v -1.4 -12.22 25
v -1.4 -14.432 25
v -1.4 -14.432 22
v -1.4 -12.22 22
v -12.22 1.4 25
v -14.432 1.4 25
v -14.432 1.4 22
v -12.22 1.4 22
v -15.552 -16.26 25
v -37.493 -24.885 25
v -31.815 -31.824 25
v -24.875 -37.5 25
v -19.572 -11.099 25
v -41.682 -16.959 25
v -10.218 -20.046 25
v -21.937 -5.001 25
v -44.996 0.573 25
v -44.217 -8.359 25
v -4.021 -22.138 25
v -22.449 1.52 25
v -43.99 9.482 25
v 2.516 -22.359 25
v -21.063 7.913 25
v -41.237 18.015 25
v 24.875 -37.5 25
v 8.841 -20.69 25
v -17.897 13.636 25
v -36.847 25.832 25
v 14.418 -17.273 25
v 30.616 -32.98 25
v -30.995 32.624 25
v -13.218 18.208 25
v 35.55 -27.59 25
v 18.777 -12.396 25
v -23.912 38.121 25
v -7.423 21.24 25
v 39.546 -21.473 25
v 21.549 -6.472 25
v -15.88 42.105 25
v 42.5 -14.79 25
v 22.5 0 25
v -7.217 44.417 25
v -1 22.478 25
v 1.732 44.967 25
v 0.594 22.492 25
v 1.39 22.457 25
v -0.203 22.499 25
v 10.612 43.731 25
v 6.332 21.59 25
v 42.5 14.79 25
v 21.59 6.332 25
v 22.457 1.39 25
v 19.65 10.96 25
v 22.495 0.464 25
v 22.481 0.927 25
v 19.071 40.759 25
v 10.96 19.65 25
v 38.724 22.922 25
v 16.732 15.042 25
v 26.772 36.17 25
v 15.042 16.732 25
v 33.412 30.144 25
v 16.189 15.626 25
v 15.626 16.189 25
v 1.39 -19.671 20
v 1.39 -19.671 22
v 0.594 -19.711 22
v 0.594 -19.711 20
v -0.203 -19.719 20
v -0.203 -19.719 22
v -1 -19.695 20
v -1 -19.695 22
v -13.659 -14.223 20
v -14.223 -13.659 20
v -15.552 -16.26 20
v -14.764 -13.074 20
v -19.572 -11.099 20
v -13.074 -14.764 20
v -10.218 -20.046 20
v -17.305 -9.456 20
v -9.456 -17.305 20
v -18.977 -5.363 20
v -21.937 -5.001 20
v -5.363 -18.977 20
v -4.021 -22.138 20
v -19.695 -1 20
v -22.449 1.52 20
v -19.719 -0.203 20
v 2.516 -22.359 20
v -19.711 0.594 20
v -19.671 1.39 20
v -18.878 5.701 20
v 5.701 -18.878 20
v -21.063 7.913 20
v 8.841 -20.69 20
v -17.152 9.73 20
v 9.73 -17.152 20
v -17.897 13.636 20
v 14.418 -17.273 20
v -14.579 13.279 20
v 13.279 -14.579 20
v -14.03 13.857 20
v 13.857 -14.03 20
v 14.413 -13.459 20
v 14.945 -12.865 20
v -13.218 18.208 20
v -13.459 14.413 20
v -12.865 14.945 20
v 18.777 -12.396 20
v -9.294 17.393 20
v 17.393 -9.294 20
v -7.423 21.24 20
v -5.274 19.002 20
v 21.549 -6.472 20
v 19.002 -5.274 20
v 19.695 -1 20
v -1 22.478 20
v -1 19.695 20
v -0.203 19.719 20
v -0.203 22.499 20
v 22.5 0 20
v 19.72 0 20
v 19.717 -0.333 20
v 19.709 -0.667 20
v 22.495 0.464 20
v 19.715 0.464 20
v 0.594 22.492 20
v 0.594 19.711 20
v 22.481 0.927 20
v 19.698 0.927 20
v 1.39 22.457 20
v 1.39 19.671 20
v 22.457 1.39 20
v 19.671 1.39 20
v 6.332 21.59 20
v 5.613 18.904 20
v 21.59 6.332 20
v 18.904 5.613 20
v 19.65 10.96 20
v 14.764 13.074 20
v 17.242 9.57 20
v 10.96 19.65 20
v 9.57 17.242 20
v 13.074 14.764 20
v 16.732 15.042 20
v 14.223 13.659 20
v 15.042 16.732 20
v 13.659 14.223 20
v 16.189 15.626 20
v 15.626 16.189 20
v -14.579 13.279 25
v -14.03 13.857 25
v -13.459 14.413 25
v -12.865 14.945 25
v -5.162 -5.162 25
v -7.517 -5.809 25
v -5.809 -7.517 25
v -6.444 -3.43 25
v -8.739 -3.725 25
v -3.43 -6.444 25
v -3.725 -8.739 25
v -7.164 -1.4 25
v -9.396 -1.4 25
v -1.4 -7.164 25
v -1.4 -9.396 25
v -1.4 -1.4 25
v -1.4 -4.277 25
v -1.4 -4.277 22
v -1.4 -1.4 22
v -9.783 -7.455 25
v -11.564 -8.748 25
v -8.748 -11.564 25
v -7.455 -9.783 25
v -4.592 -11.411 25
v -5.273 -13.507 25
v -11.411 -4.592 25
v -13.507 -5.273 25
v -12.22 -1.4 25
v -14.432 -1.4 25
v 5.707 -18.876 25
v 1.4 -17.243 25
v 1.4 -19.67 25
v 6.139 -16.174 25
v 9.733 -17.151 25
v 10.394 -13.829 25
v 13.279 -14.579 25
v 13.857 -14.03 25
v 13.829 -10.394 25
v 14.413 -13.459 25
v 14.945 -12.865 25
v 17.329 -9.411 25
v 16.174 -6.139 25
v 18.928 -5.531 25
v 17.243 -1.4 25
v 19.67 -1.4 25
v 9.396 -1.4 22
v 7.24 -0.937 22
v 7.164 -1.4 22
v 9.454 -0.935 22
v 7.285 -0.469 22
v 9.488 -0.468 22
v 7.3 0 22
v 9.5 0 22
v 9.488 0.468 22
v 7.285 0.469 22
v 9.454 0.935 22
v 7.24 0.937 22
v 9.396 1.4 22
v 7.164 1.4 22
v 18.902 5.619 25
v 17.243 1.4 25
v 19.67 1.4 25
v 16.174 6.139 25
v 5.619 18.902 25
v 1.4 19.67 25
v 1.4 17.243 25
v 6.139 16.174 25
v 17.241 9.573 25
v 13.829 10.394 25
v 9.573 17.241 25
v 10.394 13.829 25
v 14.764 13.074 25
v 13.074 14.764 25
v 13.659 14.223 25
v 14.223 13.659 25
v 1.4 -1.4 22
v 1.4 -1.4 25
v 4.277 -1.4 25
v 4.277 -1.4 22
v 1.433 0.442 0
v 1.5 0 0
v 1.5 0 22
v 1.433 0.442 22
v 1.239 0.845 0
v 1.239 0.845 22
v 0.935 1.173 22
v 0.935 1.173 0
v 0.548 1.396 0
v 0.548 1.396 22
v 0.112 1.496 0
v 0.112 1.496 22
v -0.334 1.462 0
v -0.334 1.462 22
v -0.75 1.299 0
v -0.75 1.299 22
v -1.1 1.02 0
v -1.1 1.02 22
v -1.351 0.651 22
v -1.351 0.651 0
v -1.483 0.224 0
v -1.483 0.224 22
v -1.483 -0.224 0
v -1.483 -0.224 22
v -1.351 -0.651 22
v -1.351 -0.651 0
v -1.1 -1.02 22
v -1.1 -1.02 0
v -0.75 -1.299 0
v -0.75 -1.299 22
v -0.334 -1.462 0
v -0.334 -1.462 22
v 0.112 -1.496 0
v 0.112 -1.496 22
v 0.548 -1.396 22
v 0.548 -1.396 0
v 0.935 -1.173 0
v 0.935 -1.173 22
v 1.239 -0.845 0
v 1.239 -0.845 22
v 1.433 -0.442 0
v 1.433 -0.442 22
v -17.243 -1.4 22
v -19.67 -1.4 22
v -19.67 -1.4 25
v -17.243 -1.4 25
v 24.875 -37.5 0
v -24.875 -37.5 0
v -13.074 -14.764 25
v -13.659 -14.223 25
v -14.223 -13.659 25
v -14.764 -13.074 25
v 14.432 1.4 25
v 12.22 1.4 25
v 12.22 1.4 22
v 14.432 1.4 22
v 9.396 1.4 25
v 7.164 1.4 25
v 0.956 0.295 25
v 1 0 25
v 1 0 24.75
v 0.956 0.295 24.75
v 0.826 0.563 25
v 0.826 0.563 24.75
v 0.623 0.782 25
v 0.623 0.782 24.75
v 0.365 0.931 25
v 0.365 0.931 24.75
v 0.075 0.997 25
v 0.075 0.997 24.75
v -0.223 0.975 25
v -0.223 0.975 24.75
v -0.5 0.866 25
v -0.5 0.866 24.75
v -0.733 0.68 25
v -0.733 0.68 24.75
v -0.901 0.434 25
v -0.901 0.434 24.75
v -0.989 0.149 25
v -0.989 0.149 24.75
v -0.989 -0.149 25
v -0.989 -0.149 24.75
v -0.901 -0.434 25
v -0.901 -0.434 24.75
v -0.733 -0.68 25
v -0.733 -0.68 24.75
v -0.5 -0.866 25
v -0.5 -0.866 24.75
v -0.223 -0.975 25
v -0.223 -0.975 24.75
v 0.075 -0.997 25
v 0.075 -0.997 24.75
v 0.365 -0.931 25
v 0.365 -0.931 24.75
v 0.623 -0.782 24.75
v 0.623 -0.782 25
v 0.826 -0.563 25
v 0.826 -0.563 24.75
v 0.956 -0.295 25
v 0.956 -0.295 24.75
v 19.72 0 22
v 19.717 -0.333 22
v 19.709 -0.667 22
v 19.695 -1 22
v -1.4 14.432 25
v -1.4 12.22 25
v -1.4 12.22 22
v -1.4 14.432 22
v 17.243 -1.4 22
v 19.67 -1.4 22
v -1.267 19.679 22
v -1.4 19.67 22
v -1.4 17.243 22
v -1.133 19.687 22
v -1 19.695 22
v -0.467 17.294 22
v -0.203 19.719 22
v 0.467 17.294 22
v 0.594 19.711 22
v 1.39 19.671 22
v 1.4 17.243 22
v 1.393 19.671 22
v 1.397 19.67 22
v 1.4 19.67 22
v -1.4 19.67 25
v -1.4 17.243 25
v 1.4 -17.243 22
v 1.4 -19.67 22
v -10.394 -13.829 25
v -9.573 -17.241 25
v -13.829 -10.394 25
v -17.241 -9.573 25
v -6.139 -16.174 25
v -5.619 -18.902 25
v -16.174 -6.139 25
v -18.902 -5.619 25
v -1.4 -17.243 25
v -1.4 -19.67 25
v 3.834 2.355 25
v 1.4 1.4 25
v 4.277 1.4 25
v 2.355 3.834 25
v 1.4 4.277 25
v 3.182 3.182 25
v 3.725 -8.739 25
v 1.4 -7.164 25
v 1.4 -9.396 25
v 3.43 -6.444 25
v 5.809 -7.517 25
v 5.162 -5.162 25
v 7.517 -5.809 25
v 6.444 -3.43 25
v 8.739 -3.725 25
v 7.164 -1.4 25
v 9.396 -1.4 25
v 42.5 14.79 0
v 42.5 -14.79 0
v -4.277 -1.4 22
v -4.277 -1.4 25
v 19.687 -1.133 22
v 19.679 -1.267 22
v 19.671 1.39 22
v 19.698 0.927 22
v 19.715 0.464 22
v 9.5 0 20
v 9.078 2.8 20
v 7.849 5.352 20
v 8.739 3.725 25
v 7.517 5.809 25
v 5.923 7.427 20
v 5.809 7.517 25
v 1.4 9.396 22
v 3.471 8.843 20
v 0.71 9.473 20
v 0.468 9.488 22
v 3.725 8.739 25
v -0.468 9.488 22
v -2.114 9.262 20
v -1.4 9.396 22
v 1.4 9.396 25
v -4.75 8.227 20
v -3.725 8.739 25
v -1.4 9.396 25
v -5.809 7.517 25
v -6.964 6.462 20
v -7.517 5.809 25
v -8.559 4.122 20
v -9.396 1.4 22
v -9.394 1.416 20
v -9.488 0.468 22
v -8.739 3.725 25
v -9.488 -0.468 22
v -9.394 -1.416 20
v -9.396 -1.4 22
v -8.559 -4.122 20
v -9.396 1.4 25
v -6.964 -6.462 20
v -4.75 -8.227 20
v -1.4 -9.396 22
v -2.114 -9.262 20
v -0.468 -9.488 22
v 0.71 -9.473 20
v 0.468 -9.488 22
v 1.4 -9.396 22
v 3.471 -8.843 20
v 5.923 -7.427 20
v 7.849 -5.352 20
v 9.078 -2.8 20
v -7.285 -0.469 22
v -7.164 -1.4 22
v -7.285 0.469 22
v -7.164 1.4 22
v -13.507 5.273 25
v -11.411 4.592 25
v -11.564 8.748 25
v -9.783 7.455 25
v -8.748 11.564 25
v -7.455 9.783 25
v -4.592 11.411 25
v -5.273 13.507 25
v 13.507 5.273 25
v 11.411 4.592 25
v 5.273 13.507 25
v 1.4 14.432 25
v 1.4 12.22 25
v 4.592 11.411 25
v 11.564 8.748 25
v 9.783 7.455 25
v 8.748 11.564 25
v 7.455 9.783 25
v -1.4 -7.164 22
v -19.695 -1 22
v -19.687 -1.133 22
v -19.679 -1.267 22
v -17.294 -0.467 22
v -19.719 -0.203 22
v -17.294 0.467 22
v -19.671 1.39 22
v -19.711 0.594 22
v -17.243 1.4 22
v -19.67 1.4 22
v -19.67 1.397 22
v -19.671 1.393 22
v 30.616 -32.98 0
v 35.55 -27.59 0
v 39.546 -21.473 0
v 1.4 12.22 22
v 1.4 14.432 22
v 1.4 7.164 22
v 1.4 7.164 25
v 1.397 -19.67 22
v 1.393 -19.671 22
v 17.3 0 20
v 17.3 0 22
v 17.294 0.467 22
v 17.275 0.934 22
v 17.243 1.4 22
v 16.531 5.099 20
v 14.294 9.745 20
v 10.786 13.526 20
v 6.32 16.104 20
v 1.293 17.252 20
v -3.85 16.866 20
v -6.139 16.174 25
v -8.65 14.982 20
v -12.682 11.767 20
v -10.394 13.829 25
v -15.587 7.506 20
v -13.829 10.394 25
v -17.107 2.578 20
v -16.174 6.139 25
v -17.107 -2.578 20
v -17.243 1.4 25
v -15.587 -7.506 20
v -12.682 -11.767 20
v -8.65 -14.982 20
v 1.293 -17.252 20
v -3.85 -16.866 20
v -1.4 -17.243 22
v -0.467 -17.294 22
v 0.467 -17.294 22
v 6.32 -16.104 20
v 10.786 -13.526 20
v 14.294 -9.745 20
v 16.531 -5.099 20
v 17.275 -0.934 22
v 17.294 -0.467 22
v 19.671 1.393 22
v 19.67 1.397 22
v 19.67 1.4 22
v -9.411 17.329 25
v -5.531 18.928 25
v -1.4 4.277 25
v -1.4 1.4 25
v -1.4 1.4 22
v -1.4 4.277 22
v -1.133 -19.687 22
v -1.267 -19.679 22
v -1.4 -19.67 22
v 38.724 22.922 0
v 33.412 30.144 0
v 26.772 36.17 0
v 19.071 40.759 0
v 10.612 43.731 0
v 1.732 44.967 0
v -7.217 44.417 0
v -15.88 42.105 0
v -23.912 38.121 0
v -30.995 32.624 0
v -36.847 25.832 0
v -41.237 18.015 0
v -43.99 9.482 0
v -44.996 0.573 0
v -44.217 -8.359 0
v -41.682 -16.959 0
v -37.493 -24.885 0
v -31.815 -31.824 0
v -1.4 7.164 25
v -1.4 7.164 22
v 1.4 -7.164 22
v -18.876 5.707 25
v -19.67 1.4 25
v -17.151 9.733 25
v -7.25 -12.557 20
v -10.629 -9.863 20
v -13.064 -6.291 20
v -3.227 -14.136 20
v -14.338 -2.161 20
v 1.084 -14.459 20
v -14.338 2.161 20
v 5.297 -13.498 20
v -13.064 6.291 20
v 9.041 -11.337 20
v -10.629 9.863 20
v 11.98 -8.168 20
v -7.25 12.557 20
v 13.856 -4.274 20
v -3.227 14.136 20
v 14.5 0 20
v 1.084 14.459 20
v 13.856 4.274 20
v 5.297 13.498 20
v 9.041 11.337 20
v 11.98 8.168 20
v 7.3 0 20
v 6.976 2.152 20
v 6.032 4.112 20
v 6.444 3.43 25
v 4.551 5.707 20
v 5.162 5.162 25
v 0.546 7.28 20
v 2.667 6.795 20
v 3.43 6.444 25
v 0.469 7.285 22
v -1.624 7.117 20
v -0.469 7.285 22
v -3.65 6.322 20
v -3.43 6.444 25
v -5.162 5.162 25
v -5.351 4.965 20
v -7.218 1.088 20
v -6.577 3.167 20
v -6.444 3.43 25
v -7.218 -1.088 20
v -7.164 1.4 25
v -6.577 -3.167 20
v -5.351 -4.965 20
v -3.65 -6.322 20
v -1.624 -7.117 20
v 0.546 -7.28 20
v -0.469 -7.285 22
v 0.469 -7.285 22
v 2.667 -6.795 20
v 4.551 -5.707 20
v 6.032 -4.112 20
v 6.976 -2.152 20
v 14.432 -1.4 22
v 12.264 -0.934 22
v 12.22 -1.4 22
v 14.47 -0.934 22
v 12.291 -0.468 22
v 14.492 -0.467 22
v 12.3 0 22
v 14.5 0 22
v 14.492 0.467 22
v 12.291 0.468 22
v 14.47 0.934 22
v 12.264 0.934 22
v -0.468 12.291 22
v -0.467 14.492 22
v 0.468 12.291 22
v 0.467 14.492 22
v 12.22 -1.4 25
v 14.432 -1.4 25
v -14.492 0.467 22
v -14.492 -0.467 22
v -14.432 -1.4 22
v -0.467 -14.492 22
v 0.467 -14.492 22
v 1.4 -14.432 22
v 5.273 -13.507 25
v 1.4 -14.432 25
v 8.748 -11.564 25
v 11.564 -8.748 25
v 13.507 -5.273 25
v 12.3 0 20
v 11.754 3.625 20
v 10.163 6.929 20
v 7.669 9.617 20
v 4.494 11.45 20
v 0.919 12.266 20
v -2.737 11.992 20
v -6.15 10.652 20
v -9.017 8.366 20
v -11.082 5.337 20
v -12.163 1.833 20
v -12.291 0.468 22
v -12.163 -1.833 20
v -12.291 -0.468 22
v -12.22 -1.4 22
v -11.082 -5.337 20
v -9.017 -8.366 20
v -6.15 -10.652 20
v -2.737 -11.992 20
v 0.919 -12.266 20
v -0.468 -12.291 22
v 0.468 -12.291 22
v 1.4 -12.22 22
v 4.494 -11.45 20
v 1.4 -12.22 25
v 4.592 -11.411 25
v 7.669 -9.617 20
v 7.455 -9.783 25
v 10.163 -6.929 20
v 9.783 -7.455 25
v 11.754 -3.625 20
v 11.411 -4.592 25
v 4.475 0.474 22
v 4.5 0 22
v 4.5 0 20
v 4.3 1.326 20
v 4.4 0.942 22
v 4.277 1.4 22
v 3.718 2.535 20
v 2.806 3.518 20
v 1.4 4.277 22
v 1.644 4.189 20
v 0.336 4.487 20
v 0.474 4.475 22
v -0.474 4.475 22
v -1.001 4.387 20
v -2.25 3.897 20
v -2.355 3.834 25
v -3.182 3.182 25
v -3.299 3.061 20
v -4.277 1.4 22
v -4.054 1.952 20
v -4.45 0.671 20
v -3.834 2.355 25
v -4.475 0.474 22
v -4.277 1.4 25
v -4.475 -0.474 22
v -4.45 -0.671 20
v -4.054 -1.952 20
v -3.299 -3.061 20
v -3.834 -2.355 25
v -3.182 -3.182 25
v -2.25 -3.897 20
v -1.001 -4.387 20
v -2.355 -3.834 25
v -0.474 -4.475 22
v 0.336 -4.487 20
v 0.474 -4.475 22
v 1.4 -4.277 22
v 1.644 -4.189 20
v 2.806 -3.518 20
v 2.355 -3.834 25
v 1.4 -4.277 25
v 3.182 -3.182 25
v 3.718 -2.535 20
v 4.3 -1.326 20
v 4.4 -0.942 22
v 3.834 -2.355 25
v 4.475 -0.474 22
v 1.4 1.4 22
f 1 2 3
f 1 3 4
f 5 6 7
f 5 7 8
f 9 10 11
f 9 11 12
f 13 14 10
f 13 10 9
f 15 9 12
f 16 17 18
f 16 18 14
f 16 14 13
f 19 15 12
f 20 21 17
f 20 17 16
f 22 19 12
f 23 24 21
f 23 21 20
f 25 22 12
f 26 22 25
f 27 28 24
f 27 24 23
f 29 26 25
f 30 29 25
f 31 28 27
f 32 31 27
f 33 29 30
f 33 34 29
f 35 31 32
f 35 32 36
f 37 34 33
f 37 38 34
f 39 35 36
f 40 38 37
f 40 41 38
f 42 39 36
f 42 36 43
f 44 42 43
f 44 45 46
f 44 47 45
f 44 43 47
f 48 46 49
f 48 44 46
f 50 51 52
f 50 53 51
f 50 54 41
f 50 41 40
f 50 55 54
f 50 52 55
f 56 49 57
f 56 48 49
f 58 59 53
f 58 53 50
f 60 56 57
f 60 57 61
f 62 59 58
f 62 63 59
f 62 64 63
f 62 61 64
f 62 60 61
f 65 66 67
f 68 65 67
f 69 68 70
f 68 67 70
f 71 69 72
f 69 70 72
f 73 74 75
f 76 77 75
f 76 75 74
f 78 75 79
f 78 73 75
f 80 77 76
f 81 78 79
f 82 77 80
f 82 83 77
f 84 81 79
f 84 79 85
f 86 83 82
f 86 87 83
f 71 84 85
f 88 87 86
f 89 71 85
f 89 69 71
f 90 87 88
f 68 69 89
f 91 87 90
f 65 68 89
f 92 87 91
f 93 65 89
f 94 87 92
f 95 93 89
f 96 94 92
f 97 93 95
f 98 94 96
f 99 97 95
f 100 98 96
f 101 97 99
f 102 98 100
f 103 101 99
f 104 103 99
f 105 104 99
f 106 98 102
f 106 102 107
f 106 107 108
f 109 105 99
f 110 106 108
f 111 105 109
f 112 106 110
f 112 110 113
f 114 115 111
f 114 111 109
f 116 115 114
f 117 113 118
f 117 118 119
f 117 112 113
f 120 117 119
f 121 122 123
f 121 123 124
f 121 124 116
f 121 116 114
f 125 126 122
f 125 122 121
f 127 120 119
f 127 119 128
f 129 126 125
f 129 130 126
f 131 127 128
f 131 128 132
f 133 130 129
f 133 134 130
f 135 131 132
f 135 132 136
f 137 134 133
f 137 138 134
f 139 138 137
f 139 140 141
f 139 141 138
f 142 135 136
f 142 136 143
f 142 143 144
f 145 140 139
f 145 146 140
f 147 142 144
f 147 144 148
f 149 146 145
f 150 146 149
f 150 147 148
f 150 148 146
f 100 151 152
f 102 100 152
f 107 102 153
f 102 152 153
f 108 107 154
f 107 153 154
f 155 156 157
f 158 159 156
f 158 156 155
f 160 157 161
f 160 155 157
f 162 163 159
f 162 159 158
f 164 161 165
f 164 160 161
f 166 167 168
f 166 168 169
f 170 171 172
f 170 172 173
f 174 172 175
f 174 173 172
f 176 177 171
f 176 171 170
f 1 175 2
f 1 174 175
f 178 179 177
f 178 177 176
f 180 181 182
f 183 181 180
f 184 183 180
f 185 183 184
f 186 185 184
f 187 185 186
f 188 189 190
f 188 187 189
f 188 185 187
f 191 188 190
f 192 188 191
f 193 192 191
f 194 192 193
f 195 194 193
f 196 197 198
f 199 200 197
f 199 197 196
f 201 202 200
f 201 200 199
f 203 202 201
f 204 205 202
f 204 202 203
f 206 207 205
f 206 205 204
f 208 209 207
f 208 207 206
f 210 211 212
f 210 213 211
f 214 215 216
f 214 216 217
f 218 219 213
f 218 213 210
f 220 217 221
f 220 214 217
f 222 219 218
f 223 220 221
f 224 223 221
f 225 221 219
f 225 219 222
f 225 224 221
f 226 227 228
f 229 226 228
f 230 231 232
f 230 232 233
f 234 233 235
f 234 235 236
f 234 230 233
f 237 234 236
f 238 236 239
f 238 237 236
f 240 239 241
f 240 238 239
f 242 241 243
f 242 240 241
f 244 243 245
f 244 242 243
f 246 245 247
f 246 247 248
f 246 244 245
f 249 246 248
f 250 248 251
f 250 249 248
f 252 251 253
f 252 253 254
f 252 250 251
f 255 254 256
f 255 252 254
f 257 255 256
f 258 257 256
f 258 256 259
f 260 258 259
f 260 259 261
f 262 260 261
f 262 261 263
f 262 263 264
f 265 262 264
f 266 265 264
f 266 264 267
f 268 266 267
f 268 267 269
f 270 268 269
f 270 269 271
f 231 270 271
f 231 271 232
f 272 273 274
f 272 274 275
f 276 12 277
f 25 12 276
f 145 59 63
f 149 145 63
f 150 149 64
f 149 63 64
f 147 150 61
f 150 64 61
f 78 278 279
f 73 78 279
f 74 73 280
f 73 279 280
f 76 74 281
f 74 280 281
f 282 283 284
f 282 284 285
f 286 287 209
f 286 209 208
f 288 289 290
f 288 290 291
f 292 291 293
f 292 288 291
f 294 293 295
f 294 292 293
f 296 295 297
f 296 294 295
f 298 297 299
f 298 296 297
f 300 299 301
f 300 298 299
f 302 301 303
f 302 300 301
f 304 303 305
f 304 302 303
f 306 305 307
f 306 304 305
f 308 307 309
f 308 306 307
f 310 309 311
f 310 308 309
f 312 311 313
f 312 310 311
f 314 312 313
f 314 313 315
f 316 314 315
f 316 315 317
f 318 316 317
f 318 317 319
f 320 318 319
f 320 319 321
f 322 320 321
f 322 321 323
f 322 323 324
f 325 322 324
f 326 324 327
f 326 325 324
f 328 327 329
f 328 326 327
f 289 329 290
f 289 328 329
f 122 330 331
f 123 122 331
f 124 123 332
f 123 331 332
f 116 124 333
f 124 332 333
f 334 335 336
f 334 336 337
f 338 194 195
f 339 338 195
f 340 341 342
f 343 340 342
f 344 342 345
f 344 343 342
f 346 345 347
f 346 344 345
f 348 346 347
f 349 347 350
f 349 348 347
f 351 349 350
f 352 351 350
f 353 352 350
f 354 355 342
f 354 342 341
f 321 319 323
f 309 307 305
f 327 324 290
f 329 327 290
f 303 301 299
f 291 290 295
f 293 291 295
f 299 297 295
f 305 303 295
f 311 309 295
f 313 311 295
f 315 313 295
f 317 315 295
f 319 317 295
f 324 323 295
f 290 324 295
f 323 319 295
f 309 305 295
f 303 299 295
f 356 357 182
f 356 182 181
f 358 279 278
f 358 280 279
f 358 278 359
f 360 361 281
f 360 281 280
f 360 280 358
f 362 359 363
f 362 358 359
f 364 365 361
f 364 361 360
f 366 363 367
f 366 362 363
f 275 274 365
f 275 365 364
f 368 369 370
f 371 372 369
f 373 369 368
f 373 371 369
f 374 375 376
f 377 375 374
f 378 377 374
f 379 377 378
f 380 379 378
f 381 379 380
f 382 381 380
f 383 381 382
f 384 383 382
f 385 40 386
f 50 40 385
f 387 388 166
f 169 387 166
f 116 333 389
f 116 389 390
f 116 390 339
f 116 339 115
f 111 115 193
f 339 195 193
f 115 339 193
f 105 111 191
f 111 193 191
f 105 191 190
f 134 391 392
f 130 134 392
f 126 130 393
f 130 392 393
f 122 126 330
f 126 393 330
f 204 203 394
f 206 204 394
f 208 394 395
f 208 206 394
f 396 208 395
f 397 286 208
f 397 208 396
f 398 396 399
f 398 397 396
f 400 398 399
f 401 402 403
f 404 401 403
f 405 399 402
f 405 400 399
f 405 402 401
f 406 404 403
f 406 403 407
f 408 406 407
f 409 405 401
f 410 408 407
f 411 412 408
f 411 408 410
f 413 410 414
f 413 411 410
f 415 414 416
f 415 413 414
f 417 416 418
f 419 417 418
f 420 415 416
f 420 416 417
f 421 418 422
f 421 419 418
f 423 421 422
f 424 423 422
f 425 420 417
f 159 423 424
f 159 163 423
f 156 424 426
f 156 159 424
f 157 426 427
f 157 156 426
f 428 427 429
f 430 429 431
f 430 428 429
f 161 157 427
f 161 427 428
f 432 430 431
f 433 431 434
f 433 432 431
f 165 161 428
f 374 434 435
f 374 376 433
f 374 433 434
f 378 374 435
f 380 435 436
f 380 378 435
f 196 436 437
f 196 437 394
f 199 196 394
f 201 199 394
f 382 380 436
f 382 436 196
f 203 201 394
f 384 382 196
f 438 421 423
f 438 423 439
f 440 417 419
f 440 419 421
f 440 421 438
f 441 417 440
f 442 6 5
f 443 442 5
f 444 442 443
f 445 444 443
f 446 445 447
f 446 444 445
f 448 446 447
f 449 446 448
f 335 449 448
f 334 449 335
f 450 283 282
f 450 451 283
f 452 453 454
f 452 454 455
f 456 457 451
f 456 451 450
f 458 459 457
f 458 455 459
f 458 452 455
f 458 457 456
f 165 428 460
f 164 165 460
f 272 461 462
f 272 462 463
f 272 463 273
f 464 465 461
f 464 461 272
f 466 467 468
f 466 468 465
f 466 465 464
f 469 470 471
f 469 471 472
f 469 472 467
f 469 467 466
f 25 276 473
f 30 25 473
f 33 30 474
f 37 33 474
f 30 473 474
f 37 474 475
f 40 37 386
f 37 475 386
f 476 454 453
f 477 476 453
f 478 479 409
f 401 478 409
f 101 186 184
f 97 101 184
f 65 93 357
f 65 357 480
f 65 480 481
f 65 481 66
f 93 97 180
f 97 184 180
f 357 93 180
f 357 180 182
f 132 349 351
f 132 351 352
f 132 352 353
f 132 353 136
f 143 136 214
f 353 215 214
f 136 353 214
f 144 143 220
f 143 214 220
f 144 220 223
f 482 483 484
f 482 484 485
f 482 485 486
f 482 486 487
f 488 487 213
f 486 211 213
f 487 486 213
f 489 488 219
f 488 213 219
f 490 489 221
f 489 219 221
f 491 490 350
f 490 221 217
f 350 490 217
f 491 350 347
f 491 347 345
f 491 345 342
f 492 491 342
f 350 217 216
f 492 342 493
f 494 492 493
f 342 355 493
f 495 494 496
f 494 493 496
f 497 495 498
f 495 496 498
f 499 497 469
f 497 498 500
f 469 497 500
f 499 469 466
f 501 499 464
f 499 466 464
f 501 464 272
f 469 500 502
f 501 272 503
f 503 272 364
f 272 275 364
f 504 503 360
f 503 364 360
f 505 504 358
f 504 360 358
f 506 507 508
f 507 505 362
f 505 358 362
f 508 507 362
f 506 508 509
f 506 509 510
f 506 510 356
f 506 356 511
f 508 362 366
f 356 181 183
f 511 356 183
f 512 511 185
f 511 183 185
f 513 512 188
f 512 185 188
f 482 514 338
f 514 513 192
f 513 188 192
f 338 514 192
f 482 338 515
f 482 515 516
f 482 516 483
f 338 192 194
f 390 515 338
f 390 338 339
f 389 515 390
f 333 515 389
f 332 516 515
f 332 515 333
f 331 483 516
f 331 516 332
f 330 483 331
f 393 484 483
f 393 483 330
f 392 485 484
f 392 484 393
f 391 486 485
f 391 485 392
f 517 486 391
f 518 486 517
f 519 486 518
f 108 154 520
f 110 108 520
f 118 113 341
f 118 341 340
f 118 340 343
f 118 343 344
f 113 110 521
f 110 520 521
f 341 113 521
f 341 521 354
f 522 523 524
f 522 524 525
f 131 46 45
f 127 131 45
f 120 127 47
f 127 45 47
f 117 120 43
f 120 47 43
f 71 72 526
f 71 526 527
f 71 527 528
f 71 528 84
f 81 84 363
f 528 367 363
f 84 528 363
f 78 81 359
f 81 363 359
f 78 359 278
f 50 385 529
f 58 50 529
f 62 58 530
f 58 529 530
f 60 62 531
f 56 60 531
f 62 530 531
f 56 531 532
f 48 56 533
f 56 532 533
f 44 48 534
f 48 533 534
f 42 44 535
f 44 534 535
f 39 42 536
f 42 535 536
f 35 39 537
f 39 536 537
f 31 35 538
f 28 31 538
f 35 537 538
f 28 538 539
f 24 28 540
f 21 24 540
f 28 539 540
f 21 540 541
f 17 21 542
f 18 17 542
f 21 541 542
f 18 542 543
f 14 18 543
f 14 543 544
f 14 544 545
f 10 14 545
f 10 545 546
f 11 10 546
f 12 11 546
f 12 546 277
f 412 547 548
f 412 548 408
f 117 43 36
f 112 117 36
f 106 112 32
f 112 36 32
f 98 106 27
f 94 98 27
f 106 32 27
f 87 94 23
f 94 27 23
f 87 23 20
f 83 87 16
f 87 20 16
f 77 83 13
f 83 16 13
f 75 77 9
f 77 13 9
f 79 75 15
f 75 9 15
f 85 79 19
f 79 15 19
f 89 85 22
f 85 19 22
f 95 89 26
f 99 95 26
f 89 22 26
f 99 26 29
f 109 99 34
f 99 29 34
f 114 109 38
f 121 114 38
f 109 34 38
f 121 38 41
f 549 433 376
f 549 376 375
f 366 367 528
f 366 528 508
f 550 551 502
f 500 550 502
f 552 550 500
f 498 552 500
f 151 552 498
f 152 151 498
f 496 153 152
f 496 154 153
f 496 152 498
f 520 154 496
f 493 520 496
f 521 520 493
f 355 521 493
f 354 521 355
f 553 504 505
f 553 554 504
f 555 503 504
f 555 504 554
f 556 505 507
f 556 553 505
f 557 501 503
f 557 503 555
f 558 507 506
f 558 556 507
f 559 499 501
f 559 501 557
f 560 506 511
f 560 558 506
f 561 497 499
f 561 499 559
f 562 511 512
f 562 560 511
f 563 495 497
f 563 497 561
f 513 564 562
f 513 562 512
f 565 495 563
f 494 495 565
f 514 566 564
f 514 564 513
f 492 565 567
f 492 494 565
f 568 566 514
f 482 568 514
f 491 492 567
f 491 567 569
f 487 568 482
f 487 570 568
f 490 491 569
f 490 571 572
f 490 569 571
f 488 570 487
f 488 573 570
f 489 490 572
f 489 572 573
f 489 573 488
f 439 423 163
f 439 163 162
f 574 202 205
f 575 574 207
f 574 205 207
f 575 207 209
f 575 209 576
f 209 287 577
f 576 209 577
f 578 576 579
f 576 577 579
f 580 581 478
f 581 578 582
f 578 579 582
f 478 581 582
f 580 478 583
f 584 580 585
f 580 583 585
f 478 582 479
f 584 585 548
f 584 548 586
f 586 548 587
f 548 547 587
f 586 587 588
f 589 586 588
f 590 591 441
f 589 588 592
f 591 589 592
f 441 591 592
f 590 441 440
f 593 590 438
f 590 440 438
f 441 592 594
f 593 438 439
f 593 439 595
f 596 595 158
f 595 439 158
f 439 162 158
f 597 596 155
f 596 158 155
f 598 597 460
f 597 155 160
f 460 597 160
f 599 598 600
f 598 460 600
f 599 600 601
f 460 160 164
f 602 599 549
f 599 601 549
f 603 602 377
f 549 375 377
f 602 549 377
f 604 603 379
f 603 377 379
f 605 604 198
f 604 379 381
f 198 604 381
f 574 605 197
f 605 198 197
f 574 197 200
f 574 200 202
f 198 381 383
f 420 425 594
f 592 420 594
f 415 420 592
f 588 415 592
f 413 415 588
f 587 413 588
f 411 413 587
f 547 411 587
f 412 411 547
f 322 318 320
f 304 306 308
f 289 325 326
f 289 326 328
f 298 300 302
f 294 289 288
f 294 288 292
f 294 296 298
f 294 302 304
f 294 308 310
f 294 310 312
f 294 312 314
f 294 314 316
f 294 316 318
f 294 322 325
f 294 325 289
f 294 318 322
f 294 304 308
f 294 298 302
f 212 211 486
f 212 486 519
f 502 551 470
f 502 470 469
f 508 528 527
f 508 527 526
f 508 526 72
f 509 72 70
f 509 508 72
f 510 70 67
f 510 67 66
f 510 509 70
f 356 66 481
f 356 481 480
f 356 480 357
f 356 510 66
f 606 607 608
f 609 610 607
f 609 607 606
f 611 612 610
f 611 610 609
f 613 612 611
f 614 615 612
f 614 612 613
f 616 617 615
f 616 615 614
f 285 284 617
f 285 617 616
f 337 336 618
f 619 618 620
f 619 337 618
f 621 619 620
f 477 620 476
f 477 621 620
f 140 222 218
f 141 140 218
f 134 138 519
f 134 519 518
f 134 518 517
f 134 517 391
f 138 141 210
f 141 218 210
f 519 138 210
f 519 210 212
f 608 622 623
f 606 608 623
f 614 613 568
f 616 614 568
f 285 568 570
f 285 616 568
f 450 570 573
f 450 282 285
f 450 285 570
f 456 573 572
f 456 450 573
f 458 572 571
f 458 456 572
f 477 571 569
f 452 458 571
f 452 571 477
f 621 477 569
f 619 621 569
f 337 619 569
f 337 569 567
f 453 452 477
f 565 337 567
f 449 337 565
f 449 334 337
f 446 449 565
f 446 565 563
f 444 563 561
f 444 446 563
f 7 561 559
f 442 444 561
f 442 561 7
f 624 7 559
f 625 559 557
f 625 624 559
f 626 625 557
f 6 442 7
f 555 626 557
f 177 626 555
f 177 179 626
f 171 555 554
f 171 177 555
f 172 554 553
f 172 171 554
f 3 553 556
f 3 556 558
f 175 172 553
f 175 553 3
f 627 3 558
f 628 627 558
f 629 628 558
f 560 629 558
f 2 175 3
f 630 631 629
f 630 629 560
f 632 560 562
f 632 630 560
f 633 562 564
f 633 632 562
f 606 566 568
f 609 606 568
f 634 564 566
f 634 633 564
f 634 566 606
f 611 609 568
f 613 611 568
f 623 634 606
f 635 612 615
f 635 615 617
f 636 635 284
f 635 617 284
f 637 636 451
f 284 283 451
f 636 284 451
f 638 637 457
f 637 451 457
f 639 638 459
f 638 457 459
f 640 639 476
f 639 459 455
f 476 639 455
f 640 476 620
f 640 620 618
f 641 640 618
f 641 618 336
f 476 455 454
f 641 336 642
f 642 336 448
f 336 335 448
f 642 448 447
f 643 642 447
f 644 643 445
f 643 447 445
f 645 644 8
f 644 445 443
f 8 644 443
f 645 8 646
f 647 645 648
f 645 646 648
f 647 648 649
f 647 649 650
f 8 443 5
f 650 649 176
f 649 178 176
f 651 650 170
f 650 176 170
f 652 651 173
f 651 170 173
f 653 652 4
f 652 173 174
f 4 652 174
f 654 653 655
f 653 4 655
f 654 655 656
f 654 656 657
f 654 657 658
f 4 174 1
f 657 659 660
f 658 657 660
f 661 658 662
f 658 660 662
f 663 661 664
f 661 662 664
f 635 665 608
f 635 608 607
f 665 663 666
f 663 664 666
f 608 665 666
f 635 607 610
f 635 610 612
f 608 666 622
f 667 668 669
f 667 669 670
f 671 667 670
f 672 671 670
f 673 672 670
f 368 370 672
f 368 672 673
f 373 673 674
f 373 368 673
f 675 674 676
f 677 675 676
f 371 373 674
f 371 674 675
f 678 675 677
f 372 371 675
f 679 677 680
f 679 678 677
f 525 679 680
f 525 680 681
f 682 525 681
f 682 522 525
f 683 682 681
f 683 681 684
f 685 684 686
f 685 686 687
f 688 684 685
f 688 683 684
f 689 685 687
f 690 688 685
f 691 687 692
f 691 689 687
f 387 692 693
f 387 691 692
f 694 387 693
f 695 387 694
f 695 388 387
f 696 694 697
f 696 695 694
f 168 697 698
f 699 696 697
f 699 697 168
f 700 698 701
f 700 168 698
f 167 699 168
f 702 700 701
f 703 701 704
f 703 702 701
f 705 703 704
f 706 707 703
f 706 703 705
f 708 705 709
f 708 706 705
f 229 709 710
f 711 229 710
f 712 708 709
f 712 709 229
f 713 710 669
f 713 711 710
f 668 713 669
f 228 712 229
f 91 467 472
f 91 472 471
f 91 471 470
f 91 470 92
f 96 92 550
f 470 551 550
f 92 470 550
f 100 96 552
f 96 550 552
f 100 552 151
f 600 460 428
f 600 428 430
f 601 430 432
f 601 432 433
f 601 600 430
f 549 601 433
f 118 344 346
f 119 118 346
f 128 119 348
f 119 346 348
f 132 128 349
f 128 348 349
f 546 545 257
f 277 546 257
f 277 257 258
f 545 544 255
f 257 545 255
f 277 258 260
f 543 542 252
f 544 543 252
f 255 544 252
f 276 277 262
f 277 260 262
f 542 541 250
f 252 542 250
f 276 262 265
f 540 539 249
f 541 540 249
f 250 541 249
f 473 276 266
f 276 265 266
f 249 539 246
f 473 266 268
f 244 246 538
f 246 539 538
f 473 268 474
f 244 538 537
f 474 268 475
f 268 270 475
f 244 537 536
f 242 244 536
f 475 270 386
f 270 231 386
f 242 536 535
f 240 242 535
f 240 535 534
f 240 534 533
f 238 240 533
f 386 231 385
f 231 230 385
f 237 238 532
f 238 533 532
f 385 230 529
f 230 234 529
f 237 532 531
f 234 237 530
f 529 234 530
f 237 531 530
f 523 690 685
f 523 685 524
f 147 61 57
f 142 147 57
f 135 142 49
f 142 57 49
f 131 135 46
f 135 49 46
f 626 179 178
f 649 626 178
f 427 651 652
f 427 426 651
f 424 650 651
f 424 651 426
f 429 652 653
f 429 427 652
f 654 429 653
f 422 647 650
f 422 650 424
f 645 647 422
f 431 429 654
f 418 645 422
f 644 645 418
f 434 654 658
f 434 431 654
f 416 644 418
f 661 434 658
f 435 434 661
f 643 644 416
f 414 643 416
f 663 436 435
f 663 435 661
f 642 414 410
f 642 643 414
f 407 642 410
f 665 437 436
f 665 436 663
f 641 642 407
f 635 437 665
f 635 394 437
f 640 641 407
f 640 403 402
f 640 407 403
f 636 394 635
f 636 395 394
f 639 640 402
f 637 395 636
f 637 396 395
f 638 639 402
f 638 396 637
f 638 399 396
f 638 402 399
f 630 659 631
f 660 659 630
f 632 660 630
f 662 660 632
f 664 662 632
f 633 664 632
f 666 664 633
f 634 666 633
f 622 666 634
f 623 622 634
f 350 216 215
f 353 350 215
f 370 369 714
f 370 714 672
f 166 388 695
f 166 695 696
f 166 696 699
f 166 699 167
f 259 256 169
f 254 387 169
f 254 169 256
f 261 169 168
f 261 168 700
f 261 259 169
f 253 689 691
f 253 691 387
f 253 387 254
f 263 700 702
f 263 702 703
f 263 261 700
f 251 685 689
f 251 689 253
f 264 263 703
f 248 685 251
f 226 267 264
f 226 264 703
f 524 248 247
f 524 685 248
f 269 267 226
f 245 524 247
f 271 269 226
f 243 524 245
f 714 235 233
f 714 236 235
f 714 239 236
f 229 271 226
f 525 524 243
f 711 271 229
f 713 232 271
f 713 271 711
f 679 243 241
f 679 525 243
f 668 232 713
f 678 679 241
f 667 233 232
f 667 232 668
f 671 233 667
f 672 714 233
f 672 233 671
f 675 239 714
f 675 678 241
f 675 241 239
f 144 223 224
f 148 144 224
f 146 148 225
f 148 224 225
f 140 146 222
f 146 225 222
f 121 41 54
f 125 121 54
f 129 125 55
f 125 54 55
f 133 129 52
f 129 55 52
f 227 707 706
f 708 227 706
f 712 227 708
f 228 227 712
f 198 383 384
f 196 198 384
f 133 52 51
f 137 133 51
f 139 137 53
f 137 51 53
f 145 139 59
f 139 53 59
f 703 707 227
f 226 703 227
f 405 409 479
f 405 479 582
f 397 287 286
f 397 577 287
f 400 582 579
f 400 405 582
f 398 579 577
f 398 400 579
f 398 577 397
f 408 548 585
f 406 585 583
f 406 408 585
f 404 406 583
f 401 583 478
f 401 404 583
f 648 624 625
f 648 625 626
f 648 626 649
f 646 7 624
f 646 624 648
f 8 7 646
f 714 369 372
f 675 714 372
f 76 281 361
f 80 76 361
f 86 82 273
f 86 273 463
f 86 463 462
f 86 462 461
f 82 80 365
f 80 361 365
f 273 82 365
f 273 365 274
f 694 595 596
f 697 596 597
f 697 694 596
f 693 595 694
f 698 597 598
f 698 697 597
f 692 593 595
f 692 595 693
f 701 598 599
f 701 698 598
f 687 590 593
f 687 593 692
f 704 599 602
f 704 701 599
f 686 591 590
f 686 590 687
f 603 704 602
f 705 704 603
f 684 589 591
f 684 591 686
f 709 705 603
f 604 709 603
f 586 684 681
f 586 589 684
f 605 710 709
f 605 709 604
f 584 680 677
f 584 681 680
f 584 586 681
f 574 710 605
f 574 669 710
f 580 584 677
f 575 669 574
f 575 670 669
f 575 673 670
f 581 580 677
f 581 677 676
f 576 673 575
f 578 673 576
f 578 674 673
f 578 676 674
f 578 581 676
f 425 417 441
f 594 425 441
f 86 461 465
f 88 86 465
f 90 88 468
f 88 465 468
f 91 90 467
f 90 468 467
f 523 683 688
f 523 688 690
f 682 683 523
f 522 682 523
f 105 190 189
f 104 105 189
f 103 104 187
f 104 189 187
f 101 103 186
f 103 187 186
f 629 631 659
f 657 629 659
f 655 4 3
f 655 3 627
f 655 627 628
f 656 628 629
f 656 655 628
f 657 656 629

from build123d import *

# Parameters (mm, degrees)
F0_R      = 45
F0_R_2    = 1.5
F1_DEPTH  = 25
F3_DEPTH  = 5
F4_R      = 7.3
F4_R_2    = 4.5
F5_DEPTH  = 5
F6_R      = 12.3
F6_R_2    = 9.5
F7_DEPTH  = 5
F8_R      = 17.3
F8_R_2    = 14.5
F9_DEPTH  = 5
F10_W     = 2.8
F10_H     = 40.706166
F11_W     = 41.5
F11_H     = 2.8
F12_DEPTH = 3
F13_W     = 55
F13_H     = 15
F13_W_2   = 5
F13_H_2   = 30
F14_DEPTH = 25
F15_R     = 1
F16_DEPTH = 0.25


with BuildPart() as f1:
    # F0 (on Top) → F1 (new body)
    with BuildSketch(Plane.XY):
        Circle(F0_R)
        Circle(F0_R_2, mode=Mode.SUBTRACT)
    extrude(amount=F1_DEPTH)

    # F2 (on face) → F3 (cut)
    with BuildSketch(Plane.XY.offset(25)):
        with BuildLine():
            Line((1.39, 19.670951), (1.39, 22.457023))
            ThreePointArc((1.39, 22.457023), (0.195276, 22.499153), (-1, 22.477767))
            Line((-1, 22.477767), (-1, 19.694629))
            ThreePointArc((-1, 19.694629), (0.195359, 19.719032), (1.39, 19.670951))
        make_face()
        with BuildLine():
            ThreePointArc((15.042455, 16.73244), (8.700523, 20.74972), (1.39, 22.457023))
            Line((1.39, 22.457023), (1.39, 19.670951))
            ThreePointArc((1.39, 19.670951), (7.636697, 18.181289), (13.073527, 14.763512))
            Line((13.073527, 14.763512), (15.042455, 16.73244))
        make_face()
        with BuildLine():
            Line((-1, 19.694629), (-1, 22.477767))
            ThreePointArc((-1, 22.477767), (-15.552331, -16.259613), (22.5, 0))
            ThreePointArc((22.5, 0), (22.489253, 0.695332), (22.457023, 1.39))
            Line((22.457023, 1.39), (19.670951, 1.39))
            ThreePointArc((19.670951, 1.39), (19.707734, 0.695433), (19.72, 0))
            ThreePointArc((19.72, 0), (19.713656, -0.500161), (19.694629, -1))
            ThreePointArc((19.694629, -1), (18.307857, -7.328081), (14.945301, -12.865316))
            ThreePointArc((14.945301, -12.865316), (14.138136, -13.747418), (13.278996, -14.578981))
            ThreePointArc((13.278996, -14.578981), (7.76382, -18.127369), (1.39, -19.670951))
            ThreePointArc((1.39, -19.670951), (0.195359, -19.719032), (-1, -19.694629))
            ThreePointArc((-1, -19.694629), (-7.456207, -18.256051), (-13.073527, -14.763512))
            ThreePointArc((-13.073527, -14.763512), (-13.944146, -13.944146), (-14.763512, -13.073527))
            ThreePointArc((-14.763512, -13.073527), (-18.256051, -7.456207), (-19.694629, -1))
            ThreePointArc((-19.694629, -1), (-19.719032, 0.195359), (-19.670951, 1.39))
            ThreePointArc((-19.670951, 1.39), (-18.127369, 7.76382), (-14.578981, 13.278996))
            ThreePointArc((-14.578981, 13.278996), (-13.747418, 14.138136), (-12.865316, 14.945301))
            ThreePointArc((-12.865316, 14.945301), (-7.328081, 18.307857), (-1, 19.694629))
        make_face()
        with BuildLine():
            ThreePointArc((16.73244, 15.042455), (15.909903, 15.909903), (15.042455, 16.73244))
            Line((15.042455, 16.73244), (13.073527, 14.763512))
            ThreePointArc((13.073527, 14.763512), (13.944146, 13.944146), (14.763512, 13.073527))
            Line((14.763512, 13.073527), (16.73244, 15.042455))
        make_face()
        with BuildLine():
            ThreePointArc((22.457023, 1.39), (20.74972, 8.700523), (16.73244, 15.042455))
            Line((16.73244, 15.042455), (14.763512, 13.073527))
            ThreePointArc((14.763512, 13.073527), (18.181289, 7.636697), (19.670951, 1.39))
            Line((19.670951, 1.39), (22.457023, 1.39))
        make_face()
    extrude(amount=-F3_DEPTH, mode=Mode.SUBTRACT)

    # F4 (on face) → F5 (cut)
    with BuildSketch(Plane.XY.offset(25)):
        Circle(F4_R)
        Circle(F4_R_2, mode=Mode.SUBTRACT)
    extrude(amount=-F5_DEPTH, mode=Mode.SUBTRACT)

    # F6 (on face) → F7 (cut)
    with BuildSketch(Plane.XY.offset(25)):
        Circle(F6_R)
        Circle(F6_R_2, mode=Mode.SUBTRACT)
    extrude(amount=-F7_DEPTH, mode=Mode.SUBTRACT)

    # F8 (on face) → F9 (cut)
    with BuildSketch(Plane.XY.offset(25)):
        Circle(F8_R)
        Circle(F8_R_2, mode=Mode.SUBTRACT)
    extrude(amount=-F9_DEPTH, mode=Mode.SUBTRACT)

    # F10 (on face) + F11 (on face) → F12 (cut)
    with BuildSketch(Plane.XY.offset(25)):
        Rectangle(F10_W, F10_H)
    with BuildSketch(Plane.XY.offset(25)):
        Rectangle(F11_W, F11_H)
    extrude(amount=-F12_DEPTH, mode=Mode.SUBTRACT)

    # F13 (on face) → F14 (cut)
    with BuildSketch(Plane.XY.offset(25)):
        with Locations((0, -45)):
            Rectangle(F13_W, F13_H)
        with Locations((45, 0)):
            Rectangle(F13_W_2, F13_H_2)
    extrude(amount=-F14_DEPTH, mode=Mode.SUBTRACT)


with BuildPart() as f16:
    # F15 (on face) → F16 (new body)
    with BuildSketch(Plane.XY.offset(25)):
        Circle(F15_R)
    extrude(amount=-F16_DEPTH)


solid = Compound([f1.part, f16.part])
